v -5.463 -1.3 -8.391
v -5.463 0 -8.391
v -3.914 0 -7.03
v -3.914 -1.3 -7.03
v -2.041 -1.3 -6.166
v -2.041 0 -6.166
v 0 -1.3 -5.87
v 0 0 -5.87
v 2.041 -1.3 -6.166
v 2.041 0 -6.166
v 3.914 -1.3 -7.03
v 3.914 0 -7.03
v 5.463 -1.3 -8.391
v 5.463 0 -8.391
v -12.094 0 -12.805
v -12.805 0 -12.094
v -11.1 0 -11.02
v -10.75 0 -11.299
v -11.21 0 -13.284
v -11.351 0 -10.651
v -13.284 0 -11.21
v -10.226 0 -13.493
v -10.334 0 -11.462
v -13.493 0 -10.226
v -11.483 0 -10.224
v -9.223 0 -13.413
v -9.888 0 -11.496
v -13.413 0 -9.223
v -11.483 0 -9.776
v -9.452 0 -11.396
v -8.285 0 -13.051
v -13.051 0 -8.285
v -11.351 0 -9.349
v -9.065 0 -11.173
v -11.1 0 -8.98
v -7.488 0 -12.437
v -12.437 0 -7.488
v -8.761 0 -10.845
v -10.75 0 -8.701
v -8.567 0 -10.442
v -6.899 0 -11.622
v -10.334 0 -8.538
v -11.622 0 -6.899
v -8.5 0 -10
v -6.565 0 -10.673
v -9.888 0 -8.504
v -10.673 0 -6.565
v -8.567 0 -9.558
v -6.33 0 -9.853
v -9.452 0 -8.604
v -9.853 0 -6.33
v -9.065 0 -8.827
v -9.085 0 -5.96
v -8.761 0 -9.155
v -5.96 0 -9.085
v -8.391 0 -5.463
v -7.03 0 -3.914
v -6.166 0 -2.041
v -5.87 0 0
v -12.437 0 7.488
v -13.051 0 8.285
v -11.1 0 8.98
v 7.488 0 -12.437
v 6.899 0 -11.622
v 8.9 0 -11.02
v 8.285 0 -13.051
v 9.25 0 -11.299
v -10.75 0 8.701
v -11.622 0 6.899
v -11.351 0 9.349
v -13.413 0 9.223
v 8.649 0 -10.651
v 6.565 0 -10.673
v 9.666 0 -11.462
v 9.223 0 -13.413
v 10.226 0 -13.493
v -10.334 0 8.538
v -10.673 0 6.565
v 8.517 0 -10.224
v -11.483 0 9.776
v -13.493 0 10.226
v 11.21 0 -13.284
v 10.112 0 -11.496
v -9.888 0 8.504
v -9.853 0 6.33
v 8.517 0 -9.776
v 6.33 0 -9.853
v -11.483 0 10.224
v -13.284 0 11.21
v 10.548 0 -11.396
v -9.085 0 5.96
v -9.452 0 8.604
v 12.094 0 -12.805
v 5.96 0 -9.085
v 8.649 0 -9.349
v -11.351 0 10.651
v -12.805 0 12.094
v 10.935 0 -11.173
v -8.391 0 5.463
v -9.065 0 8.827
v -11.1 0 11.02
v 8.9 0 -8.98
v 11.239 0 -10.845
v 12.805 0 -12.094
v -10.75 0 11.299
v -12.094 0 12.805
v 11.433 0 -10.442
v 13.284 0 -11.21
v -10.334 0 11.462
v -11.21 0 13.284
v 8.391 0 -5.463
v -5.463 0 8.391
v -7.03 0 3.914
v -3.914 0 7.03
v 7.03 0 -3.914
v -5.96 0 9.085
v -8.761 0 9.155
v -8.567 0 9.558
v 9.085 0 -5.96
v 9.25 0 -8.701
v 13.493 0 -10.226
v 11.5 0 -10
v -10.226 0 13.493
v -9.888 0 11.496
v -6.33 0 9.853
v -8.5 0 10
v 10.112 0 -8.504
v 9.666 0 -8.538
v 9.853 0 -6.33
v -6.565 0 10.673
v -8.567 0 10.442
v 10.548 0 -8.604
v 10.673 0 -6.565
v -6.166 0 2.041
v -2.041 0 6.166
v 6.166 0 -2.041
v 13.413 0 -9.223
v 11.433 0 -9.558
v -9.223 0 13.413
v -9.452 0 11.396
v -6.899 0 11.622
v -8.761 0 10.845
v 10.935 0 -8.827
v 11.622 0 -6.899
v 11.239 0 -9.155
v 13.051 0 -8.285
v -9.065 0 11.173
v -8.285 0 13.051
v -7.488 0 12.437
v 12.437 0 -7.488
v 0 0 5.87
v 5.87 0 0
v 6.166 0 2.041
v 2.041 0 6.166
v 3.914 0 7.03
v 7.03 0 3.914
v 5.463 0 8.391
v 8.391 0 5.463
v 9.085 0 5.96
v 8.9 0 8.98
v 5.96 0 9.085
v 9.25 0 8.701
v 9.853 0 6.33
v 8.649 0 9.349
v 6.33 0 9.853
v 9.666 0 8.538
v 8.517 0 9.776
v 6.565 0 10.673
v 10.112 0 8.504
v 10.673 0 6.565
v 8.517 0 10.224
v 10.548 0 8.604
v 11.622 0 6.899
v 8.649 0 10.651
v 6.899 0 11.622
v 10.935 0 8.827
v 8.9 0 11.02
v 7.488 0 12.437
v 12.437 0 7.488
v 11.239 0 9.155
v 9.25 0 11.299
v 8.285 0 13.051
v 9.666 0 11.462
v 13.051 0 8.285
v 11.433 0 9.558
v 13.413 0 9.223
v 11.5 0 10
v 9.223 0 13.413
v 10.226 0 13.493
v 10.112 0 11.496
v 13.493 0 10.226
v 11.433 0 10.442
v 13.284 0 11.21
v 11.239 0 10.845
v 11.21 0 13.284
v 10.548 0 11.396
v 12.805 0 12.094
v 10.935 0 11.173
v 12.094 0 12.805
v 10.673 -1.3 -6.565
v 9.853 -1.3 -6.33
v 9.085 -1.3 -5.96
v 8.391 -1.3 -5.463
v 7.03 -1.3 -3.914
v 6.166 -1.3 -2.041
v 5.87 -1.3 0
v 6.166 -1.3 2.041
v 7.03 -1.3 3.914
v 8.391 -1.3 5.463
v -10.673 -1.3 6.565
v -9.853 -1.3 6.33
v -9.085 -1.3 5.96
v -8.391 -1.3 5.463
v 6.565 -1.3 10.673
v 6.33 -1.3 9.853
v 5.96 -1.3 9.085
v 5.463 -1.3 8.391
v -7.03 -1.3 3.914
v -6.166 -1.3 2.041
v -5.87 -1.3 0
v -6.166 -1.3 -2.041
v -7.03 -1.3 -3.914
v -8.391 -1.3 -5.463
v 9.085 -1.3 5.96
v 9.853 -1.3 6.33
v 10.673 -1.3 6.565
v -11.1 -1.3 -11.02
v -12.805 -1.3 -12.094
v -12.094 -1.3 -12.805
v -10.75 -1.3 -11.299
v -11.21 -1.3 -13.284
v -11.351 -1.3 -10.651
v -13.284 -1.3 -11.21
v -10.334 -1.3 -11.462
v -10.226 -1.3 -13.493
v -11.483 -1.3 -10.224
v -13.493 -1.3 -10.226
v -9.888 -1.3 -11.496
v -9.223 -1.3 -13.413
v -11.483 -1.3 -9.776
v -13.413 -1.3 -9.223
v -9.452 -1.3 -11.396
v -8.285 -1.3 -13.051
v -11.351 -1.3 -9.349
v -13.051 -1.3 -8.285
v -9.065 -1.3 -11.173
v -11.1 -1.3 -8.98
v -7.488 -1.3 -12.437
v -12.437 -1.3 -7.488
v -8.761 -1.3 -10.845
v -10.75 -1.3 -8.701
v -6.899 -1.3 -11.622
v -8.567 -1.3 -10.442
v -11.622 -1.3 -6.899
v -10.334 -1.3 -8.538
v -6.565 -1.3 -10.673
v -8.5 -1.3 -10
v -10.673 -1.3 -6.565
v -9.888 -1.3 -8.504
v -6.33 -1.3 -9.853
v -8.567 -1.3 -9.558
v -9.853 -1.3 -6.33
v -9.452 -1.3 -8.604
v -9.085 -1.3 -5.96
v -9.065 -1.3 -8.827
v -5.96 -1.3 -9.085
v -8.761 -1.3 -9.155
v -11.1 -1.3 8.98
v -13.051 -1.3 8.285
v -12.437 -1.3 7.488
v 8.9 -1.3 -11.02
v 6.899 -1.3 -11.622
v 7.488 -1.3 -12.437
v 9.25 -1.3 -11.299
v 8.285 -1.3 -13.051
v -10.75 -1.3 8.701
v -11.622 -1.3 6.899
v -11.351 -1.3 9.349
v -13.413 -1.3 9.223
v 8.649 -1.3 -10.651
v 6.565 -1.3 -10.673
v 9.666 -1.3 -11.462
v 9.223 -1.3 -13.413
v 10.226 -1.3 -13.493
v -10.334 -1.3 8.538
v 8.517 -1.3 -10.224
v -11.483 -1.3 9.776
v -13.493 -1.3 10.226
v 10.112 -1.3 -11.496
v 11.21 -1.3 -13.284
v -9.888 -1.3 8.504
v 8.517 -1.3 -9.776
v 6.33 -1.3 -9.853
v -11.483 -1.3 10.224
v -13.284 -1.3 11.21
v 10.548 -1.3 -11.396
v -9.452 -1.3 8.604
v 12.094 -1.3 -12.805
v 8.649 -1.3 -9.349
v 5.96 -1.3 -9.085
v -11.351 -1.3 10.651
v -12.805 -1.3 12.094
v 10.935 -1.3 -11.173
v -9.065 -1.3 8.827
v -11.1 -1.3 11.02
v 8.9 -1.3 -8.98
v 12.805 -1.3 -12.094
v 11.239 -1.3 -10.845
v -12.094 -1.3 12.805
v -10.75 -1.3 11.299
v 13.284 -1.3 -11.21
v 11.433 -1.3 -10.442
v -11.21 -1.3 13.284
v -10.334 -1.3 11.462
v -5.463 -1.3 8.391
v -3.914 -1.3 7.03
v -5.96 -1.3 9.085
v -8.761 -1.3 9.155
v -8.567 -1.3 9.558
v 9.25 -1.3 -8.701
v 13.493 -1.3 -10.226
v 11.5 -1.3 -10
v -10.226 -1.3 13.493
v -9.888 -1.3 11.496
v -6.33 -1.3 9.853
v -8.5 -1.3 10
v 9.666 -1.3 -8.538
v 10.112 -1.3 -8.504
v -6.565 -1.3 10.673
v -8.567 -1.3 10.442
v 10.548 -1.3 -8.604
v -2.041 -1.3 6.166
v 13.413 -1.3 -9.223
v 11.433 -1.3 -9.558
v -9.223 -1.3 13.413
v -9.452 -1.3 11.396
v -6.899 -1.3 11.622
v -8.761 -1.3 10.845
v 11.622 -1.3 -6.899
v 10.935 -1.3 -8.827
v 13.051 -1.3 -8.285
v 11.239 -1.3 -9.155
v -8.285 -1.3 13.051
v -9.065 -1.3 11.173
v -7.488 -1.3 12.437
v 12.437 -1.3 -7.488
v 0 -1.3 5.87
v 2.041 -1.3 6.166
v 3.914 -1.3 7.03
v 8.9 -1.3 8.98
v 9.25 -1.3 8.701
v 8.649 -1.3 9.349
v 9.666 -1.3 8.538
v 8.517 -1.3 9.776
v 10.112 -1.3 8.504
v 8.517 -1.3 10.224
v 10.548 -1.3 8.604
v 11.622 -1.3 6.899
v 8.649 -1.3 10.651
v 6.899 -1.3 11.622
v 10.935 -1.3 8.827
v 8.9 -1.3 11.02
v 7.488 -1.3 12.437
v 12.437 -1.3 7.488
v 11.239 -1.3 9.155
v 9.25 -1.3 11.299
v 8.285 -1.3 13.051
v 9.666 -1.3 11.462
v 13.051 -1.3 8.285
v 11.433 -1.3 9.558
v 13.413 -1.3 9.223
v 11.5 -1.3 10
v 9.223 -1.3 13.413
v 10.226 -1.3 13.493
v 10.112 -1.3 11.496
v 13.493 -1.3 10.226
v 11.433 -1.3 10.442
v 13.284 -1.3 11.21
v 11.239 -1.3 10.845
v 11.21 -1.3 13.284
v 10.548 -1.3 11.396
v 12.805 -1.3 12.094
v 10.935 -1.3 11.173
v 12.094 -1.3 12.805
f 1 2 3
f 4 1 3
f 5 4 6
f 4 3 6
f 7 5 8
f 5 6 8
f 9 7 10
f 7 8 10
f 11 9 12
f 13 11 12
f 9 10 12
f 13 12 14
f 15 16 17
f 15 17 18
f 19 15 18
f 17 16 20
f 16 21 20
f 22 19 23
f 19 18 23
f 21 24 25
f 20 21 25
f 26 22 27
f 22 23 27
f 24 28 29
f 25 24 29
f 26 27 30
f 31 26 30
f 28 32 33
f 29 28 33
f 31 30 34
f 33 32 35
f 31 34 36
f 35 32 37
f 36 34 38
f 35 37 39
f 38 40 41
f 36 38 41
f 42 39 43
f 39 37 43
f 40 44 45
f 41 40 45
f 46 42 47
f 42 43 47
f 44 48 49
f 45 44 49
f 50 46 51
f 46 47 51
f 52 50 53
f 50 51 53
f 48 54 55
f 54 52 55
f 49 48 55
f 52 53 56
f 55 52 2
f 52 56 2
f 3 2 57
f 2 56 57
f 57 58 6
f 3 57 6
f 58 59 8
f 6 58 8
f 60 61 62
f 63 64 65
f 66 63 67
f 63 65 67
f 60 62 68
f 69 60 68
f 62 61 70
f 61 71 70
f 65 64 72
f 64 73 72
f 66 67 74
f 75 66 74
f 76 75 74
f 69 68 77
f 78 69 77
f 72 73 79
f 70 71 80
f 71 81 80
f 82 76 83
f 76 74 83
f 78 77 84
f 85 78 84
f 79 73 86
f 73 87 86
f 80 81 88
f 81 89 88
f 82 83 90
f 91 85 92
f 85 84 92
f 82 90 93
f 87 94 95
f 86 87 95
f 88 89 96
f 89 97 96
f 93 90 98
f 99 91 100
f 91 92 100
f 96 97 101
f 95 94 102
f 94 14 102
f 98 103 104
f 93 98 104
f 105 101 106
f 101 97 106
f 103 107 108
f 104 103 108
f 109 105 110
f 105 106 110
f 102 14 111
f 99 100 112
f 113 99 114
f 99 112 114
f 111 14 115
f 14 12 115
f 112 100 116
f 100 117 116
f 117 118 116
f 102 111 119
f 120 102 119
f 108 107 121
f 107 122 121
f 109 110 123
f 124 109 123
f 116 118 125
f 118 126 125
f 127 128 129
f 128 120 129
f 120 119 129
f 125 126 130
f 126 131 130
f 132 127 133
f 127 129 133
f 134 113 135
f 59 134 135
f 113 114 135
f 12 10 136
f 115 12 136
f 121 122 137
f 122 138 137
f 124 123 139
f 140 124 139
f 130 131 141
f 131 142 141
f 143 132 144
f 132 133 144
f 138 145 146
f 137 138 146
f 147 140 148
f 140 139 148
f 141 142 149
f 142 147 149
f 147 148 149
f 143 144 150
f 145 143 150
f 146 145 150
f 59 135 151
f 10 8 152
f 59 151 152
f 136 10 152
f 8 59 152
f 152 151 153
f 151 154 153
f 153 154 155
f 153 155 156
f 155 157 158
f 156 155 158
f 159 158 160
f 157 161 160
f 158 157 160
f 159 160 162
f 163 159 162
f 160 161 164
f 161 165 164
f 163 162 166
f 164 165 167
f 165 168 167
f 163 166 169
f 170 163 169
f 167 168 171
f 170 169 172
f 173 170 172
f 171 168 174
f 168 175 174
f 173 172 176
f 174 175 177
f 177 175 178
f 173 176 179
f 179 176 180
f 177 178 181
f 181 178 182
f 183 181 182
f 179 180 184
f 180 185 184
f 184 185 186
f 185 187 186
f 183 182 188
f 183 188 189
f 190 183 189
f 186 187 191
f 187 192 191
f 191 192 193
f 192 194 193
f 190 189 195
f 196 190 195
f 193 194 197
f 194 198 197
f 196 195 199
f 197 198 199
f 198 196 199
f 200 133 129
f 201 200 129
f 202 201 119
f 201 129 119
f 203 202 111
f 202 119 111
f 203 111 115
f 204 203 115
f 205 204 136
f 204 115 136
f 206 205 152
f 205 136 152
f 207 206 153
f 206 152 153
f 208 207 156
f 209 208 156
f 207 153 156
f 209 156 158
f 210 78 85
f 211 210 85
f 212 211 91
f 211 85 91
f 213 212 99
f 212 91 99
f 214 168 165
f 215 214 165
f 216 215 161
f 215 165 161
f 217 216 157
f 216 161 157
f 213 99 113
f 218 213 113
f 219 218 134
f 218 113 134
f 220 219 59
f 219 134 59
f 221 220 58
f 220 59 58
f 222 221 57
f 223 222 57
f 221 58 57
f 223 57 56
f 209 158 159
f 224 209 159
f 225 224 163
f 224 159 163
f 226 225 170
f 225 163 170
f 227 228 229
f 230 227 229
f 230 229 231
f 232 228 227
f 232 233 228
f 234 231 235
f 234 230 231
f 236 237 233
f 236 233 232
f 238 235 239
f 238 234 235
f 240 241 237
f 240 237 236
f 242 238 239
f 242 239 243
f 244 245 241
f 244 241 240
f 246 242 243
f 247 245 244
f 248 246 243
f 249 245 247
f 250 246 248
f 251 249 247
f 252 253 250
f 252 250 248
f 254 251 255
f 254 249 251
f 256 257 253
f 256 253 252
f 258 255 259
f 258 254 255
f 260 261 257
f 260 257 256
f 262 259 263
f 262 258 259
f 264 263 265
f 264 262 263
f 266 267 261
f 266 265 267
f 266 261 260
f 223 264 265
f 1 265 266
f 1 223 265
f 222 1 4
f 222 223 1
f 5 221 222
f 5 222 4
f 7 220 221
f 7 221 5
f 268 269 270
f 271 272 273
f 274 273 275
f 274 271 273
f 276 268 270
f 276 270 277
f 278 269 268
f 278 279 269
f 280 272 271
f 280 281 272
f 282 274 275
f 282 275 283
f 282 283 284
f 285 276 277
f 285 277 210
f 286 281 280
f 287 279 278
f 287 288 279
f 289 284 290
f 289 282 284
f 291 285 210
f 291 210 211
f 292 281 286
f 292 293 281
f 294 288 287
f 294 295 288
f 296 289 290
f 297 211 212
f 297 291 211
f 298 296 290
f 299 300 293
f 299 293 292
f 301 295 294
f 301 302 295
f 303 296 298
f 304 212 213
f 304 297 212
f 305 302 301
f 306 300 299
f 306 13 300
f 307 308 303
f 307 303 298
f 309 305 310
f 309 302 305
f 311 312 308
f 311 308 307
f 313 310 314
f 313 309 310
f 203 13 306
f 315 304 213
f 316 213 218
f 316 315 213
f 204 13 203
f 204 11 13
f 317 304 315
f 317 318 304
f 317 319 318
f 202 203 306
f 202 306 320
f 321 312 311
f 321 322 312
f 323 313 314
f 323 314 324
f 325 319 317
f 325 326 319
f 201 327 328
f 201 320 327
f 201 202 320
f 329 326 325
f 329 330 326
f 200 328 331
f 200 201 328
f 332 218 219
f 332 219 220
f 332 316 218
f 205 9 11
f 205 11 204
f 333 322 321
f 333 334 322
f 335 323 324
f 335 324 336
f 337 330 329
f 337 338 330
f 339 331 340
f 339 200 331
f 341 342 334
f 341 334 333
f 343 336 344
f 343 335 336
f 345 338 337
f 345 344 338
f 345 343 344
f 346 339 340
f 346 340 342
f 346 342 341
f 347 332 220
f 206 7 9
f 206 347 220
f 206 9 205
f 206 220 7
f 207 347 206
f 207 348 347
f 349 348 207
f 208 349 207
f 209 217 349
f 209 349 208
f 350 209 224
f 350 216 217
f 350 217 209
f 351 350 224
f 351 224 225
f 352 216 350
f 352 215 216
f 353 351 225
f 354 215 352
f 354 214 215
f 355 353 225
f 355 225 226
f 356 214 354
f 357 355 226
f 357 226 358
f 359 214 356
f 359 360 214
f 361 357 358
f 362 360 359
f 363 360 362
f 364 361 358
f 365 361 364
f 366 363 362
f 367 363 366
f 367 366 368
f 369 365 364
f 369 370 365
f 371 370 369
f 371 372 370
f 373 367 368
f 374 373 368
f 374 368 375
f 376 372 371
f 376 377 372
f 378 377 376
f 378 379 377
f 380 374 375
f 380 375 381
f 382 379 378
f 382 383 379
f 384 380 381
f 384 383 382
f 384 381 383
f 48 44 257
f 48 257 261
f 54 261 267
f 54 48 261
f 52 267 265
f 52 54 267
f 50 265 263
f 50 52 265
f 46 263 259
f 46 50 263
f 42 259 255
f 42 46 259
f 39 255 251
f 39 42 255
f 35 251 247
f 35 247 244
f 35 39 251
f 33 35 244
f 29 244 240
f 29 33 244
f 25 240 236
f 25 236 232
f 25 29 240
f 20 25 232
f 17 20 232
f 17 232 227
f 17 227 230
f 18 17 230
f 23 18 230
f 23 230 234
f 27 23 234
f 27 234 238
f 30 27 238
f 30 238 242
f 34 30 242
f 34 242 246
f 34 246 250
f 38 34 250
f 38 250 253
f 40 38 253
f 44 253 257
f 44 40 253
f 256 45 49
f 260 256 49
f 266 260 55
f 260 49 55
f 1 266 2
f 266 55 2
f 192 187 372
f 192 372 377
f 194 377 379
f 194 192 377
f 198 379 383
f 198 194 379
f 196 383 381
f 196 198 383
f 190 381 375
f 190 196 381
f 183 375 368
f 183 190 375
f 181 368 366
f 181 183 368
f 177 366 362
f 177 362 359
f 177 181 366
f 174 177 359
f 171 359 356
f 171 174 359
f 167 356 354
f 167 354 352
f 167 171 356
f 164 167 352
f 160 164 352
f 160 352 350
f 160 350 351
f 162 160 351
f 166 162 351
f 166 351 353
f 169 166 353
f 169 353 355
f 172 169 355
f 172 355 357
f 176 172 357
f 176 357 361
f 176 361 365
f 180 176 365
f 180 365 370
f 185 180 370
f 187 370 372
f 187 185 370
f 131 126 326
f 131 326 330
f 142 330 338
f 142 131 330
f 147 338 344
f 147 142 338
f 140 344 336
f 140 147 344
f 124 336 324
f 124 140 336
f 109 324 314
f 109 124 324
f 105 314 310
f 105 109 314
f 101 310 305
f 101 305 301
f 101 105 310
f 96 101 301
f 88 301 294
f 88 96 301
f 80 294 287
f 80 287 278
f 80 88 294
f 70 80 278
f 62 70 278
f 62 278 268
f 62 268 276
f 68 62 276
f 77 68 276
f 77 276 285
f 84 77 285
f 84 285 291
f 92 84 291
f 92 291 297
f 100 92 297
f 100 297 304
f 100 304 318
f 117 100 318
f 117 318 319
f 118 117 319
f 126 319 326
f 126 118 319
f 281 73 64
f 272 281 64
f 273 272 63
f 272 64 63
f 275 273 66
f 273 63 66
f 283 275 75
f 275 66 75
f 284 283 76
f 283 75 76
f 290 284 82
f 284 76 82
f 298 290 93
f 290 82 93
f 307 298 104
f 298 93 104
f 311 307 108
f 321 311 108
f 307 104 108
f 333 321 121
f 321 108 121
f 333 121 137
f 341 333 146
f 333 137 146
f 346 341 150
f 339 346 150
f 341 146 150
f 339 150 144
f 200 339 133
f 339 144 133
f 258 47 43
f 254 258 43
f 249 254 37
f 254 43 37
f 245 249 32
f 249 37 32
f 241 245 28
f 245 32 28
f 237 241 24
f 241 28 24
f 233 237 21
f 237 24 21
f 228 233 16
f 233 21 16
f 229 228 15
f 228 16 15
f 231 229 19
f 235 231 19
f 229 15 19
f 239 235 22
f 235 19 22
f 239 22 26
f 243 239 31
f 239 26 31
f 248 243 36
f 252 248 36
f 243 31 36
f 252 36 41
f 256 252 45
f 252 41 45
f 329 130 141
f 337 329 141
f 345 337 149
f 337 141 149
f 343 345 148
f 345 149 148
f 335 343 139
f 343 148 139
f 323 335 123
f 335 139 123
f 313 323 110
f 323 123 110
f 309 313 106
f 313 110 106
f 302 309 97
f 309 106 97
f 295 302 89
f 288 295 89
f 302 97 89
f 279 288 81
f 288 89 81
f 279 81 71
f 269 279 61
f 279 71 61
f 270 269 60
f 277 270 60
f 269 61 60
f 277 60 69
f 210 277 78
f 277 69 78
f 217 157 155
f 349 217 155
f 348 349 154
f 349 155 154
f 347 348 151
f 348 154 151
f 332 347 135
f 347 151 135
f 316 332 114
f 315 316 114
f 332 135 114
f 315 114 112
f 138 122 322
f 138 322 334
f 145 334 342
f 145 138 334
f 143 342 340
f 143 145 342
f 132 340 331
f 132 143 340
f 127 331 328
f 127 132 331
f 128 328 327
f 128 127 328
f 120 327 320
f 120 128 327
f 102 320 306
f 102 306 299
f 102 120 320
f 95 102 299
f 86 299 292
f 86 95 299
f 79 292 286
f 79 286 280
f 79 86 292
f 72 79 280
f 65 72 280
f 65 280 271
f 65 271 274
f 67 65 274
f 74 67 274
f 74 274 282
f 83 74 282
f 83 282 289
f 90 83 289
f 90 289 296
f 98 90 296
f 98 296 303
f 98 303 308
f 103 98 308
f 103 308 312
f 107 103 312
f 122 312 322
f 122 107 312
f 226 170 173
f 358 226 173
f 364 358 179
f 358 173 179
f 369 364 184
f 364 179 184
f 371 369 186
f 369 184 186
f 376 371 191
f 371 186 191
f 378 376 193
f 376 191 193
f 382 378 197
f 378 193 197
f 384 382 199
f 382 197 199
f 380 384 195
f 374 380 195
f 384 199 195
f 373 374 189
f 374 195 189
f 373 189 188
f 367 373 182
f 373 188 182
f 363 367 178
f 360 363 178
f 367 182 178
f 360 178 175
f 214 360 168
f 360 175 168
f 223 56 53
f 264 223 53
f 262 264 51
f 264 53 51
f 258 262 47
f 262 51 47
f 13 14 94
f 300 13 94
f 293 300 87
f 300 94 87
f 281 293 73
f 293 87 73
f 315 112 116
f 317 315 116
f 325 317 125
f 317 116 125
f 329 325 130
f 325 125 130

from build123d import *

# Parameters (mm, degrees)
F0_R     = 1.5
F1_DEPTH = 1.3


with BuildPart() as f1:
    # F0 (on Front) → F1 (new body)
    with BuildSketch(Plane.XZ):
        with BuildLine():
            ThreePointArc((-8.391363, -5.463446), (-9.461447, -6.161412), (-10.673479, -6.565408))
            ThreePointArc((-10.673479, -6.565408), (-12.474874, -12.474874), (-6.565408, -10.673479))
            ThreePointArc((-6.565408, -10.673479), (-6.161412, -9.461447), (-5.463446, -8.391363))
            ThreePointArc((-5.463446, -8.391363), (0, -5.870058), (5.463446, -8.391363))
            ThreePointArc((5.463446, -8.391363), (6.161412, -9.461447), (6.565408, -10.673479))
            ThreePointArc((6.565408, -10.673479), (12.474874, -12.474874), (10.673479, -6.565408))
            ThreePointArc((10.673479, -6.565408), (9.461447, -6.161412), (8.391363, -5.463446))
            ThreePointArc((8.391363, -5.463446), (5.870058, 0), (8.391363, 5.463446))
            ThreePointArc((8.391363, 5.463446), (9.461447, 6.161412), (10.673479, 6.565408))
            ThreePointArc((10.673479, 6.565408), (12.474874, 12.474874), (6.565408, 10.673479))
            ThreePointArc((6.565408, 10.673479), (6.161412, 9.461447), (5.463446, 8.391363))
            ThreePointArc((5.463446, 8.391363), (0, 5.870058), (-5.463446, 8.391363))
            ThreePointArc((-5.463446, 8.391363), (-6.161412, 9.461447), (-6.565408, 10.673479))
            ThreePointArc((-6.565408, 10.673479), (-12.474874, 12.474874), (-10.673479, 6.565408))
            ThreePointArc((-10.673479, 6.565408), (-9.461447, 6.161412), (-8.391363, 5.463446))
            ThreePointArc((-8.391363, 5.463446), (-5.870058, 0), (-8.391363, -5.463446))
        make_face()
        with Locations((-10, -10)):
            Circle(F0_R, mode=Mode.SUBTRACT)
        with Locations((10, -10)):
            Circle(F0_R, mode=Mode.SUBTRACT)
        with Locations((-10, 10)):
            Circle(F0_R, mode=Mode.SUBTRACT)
        with Locations((10, 10)):
            Circle(F0_R, mode=Mode.SUBTRACT)
    extrude(amount=F1_DEPTH)


solid = f1.part
